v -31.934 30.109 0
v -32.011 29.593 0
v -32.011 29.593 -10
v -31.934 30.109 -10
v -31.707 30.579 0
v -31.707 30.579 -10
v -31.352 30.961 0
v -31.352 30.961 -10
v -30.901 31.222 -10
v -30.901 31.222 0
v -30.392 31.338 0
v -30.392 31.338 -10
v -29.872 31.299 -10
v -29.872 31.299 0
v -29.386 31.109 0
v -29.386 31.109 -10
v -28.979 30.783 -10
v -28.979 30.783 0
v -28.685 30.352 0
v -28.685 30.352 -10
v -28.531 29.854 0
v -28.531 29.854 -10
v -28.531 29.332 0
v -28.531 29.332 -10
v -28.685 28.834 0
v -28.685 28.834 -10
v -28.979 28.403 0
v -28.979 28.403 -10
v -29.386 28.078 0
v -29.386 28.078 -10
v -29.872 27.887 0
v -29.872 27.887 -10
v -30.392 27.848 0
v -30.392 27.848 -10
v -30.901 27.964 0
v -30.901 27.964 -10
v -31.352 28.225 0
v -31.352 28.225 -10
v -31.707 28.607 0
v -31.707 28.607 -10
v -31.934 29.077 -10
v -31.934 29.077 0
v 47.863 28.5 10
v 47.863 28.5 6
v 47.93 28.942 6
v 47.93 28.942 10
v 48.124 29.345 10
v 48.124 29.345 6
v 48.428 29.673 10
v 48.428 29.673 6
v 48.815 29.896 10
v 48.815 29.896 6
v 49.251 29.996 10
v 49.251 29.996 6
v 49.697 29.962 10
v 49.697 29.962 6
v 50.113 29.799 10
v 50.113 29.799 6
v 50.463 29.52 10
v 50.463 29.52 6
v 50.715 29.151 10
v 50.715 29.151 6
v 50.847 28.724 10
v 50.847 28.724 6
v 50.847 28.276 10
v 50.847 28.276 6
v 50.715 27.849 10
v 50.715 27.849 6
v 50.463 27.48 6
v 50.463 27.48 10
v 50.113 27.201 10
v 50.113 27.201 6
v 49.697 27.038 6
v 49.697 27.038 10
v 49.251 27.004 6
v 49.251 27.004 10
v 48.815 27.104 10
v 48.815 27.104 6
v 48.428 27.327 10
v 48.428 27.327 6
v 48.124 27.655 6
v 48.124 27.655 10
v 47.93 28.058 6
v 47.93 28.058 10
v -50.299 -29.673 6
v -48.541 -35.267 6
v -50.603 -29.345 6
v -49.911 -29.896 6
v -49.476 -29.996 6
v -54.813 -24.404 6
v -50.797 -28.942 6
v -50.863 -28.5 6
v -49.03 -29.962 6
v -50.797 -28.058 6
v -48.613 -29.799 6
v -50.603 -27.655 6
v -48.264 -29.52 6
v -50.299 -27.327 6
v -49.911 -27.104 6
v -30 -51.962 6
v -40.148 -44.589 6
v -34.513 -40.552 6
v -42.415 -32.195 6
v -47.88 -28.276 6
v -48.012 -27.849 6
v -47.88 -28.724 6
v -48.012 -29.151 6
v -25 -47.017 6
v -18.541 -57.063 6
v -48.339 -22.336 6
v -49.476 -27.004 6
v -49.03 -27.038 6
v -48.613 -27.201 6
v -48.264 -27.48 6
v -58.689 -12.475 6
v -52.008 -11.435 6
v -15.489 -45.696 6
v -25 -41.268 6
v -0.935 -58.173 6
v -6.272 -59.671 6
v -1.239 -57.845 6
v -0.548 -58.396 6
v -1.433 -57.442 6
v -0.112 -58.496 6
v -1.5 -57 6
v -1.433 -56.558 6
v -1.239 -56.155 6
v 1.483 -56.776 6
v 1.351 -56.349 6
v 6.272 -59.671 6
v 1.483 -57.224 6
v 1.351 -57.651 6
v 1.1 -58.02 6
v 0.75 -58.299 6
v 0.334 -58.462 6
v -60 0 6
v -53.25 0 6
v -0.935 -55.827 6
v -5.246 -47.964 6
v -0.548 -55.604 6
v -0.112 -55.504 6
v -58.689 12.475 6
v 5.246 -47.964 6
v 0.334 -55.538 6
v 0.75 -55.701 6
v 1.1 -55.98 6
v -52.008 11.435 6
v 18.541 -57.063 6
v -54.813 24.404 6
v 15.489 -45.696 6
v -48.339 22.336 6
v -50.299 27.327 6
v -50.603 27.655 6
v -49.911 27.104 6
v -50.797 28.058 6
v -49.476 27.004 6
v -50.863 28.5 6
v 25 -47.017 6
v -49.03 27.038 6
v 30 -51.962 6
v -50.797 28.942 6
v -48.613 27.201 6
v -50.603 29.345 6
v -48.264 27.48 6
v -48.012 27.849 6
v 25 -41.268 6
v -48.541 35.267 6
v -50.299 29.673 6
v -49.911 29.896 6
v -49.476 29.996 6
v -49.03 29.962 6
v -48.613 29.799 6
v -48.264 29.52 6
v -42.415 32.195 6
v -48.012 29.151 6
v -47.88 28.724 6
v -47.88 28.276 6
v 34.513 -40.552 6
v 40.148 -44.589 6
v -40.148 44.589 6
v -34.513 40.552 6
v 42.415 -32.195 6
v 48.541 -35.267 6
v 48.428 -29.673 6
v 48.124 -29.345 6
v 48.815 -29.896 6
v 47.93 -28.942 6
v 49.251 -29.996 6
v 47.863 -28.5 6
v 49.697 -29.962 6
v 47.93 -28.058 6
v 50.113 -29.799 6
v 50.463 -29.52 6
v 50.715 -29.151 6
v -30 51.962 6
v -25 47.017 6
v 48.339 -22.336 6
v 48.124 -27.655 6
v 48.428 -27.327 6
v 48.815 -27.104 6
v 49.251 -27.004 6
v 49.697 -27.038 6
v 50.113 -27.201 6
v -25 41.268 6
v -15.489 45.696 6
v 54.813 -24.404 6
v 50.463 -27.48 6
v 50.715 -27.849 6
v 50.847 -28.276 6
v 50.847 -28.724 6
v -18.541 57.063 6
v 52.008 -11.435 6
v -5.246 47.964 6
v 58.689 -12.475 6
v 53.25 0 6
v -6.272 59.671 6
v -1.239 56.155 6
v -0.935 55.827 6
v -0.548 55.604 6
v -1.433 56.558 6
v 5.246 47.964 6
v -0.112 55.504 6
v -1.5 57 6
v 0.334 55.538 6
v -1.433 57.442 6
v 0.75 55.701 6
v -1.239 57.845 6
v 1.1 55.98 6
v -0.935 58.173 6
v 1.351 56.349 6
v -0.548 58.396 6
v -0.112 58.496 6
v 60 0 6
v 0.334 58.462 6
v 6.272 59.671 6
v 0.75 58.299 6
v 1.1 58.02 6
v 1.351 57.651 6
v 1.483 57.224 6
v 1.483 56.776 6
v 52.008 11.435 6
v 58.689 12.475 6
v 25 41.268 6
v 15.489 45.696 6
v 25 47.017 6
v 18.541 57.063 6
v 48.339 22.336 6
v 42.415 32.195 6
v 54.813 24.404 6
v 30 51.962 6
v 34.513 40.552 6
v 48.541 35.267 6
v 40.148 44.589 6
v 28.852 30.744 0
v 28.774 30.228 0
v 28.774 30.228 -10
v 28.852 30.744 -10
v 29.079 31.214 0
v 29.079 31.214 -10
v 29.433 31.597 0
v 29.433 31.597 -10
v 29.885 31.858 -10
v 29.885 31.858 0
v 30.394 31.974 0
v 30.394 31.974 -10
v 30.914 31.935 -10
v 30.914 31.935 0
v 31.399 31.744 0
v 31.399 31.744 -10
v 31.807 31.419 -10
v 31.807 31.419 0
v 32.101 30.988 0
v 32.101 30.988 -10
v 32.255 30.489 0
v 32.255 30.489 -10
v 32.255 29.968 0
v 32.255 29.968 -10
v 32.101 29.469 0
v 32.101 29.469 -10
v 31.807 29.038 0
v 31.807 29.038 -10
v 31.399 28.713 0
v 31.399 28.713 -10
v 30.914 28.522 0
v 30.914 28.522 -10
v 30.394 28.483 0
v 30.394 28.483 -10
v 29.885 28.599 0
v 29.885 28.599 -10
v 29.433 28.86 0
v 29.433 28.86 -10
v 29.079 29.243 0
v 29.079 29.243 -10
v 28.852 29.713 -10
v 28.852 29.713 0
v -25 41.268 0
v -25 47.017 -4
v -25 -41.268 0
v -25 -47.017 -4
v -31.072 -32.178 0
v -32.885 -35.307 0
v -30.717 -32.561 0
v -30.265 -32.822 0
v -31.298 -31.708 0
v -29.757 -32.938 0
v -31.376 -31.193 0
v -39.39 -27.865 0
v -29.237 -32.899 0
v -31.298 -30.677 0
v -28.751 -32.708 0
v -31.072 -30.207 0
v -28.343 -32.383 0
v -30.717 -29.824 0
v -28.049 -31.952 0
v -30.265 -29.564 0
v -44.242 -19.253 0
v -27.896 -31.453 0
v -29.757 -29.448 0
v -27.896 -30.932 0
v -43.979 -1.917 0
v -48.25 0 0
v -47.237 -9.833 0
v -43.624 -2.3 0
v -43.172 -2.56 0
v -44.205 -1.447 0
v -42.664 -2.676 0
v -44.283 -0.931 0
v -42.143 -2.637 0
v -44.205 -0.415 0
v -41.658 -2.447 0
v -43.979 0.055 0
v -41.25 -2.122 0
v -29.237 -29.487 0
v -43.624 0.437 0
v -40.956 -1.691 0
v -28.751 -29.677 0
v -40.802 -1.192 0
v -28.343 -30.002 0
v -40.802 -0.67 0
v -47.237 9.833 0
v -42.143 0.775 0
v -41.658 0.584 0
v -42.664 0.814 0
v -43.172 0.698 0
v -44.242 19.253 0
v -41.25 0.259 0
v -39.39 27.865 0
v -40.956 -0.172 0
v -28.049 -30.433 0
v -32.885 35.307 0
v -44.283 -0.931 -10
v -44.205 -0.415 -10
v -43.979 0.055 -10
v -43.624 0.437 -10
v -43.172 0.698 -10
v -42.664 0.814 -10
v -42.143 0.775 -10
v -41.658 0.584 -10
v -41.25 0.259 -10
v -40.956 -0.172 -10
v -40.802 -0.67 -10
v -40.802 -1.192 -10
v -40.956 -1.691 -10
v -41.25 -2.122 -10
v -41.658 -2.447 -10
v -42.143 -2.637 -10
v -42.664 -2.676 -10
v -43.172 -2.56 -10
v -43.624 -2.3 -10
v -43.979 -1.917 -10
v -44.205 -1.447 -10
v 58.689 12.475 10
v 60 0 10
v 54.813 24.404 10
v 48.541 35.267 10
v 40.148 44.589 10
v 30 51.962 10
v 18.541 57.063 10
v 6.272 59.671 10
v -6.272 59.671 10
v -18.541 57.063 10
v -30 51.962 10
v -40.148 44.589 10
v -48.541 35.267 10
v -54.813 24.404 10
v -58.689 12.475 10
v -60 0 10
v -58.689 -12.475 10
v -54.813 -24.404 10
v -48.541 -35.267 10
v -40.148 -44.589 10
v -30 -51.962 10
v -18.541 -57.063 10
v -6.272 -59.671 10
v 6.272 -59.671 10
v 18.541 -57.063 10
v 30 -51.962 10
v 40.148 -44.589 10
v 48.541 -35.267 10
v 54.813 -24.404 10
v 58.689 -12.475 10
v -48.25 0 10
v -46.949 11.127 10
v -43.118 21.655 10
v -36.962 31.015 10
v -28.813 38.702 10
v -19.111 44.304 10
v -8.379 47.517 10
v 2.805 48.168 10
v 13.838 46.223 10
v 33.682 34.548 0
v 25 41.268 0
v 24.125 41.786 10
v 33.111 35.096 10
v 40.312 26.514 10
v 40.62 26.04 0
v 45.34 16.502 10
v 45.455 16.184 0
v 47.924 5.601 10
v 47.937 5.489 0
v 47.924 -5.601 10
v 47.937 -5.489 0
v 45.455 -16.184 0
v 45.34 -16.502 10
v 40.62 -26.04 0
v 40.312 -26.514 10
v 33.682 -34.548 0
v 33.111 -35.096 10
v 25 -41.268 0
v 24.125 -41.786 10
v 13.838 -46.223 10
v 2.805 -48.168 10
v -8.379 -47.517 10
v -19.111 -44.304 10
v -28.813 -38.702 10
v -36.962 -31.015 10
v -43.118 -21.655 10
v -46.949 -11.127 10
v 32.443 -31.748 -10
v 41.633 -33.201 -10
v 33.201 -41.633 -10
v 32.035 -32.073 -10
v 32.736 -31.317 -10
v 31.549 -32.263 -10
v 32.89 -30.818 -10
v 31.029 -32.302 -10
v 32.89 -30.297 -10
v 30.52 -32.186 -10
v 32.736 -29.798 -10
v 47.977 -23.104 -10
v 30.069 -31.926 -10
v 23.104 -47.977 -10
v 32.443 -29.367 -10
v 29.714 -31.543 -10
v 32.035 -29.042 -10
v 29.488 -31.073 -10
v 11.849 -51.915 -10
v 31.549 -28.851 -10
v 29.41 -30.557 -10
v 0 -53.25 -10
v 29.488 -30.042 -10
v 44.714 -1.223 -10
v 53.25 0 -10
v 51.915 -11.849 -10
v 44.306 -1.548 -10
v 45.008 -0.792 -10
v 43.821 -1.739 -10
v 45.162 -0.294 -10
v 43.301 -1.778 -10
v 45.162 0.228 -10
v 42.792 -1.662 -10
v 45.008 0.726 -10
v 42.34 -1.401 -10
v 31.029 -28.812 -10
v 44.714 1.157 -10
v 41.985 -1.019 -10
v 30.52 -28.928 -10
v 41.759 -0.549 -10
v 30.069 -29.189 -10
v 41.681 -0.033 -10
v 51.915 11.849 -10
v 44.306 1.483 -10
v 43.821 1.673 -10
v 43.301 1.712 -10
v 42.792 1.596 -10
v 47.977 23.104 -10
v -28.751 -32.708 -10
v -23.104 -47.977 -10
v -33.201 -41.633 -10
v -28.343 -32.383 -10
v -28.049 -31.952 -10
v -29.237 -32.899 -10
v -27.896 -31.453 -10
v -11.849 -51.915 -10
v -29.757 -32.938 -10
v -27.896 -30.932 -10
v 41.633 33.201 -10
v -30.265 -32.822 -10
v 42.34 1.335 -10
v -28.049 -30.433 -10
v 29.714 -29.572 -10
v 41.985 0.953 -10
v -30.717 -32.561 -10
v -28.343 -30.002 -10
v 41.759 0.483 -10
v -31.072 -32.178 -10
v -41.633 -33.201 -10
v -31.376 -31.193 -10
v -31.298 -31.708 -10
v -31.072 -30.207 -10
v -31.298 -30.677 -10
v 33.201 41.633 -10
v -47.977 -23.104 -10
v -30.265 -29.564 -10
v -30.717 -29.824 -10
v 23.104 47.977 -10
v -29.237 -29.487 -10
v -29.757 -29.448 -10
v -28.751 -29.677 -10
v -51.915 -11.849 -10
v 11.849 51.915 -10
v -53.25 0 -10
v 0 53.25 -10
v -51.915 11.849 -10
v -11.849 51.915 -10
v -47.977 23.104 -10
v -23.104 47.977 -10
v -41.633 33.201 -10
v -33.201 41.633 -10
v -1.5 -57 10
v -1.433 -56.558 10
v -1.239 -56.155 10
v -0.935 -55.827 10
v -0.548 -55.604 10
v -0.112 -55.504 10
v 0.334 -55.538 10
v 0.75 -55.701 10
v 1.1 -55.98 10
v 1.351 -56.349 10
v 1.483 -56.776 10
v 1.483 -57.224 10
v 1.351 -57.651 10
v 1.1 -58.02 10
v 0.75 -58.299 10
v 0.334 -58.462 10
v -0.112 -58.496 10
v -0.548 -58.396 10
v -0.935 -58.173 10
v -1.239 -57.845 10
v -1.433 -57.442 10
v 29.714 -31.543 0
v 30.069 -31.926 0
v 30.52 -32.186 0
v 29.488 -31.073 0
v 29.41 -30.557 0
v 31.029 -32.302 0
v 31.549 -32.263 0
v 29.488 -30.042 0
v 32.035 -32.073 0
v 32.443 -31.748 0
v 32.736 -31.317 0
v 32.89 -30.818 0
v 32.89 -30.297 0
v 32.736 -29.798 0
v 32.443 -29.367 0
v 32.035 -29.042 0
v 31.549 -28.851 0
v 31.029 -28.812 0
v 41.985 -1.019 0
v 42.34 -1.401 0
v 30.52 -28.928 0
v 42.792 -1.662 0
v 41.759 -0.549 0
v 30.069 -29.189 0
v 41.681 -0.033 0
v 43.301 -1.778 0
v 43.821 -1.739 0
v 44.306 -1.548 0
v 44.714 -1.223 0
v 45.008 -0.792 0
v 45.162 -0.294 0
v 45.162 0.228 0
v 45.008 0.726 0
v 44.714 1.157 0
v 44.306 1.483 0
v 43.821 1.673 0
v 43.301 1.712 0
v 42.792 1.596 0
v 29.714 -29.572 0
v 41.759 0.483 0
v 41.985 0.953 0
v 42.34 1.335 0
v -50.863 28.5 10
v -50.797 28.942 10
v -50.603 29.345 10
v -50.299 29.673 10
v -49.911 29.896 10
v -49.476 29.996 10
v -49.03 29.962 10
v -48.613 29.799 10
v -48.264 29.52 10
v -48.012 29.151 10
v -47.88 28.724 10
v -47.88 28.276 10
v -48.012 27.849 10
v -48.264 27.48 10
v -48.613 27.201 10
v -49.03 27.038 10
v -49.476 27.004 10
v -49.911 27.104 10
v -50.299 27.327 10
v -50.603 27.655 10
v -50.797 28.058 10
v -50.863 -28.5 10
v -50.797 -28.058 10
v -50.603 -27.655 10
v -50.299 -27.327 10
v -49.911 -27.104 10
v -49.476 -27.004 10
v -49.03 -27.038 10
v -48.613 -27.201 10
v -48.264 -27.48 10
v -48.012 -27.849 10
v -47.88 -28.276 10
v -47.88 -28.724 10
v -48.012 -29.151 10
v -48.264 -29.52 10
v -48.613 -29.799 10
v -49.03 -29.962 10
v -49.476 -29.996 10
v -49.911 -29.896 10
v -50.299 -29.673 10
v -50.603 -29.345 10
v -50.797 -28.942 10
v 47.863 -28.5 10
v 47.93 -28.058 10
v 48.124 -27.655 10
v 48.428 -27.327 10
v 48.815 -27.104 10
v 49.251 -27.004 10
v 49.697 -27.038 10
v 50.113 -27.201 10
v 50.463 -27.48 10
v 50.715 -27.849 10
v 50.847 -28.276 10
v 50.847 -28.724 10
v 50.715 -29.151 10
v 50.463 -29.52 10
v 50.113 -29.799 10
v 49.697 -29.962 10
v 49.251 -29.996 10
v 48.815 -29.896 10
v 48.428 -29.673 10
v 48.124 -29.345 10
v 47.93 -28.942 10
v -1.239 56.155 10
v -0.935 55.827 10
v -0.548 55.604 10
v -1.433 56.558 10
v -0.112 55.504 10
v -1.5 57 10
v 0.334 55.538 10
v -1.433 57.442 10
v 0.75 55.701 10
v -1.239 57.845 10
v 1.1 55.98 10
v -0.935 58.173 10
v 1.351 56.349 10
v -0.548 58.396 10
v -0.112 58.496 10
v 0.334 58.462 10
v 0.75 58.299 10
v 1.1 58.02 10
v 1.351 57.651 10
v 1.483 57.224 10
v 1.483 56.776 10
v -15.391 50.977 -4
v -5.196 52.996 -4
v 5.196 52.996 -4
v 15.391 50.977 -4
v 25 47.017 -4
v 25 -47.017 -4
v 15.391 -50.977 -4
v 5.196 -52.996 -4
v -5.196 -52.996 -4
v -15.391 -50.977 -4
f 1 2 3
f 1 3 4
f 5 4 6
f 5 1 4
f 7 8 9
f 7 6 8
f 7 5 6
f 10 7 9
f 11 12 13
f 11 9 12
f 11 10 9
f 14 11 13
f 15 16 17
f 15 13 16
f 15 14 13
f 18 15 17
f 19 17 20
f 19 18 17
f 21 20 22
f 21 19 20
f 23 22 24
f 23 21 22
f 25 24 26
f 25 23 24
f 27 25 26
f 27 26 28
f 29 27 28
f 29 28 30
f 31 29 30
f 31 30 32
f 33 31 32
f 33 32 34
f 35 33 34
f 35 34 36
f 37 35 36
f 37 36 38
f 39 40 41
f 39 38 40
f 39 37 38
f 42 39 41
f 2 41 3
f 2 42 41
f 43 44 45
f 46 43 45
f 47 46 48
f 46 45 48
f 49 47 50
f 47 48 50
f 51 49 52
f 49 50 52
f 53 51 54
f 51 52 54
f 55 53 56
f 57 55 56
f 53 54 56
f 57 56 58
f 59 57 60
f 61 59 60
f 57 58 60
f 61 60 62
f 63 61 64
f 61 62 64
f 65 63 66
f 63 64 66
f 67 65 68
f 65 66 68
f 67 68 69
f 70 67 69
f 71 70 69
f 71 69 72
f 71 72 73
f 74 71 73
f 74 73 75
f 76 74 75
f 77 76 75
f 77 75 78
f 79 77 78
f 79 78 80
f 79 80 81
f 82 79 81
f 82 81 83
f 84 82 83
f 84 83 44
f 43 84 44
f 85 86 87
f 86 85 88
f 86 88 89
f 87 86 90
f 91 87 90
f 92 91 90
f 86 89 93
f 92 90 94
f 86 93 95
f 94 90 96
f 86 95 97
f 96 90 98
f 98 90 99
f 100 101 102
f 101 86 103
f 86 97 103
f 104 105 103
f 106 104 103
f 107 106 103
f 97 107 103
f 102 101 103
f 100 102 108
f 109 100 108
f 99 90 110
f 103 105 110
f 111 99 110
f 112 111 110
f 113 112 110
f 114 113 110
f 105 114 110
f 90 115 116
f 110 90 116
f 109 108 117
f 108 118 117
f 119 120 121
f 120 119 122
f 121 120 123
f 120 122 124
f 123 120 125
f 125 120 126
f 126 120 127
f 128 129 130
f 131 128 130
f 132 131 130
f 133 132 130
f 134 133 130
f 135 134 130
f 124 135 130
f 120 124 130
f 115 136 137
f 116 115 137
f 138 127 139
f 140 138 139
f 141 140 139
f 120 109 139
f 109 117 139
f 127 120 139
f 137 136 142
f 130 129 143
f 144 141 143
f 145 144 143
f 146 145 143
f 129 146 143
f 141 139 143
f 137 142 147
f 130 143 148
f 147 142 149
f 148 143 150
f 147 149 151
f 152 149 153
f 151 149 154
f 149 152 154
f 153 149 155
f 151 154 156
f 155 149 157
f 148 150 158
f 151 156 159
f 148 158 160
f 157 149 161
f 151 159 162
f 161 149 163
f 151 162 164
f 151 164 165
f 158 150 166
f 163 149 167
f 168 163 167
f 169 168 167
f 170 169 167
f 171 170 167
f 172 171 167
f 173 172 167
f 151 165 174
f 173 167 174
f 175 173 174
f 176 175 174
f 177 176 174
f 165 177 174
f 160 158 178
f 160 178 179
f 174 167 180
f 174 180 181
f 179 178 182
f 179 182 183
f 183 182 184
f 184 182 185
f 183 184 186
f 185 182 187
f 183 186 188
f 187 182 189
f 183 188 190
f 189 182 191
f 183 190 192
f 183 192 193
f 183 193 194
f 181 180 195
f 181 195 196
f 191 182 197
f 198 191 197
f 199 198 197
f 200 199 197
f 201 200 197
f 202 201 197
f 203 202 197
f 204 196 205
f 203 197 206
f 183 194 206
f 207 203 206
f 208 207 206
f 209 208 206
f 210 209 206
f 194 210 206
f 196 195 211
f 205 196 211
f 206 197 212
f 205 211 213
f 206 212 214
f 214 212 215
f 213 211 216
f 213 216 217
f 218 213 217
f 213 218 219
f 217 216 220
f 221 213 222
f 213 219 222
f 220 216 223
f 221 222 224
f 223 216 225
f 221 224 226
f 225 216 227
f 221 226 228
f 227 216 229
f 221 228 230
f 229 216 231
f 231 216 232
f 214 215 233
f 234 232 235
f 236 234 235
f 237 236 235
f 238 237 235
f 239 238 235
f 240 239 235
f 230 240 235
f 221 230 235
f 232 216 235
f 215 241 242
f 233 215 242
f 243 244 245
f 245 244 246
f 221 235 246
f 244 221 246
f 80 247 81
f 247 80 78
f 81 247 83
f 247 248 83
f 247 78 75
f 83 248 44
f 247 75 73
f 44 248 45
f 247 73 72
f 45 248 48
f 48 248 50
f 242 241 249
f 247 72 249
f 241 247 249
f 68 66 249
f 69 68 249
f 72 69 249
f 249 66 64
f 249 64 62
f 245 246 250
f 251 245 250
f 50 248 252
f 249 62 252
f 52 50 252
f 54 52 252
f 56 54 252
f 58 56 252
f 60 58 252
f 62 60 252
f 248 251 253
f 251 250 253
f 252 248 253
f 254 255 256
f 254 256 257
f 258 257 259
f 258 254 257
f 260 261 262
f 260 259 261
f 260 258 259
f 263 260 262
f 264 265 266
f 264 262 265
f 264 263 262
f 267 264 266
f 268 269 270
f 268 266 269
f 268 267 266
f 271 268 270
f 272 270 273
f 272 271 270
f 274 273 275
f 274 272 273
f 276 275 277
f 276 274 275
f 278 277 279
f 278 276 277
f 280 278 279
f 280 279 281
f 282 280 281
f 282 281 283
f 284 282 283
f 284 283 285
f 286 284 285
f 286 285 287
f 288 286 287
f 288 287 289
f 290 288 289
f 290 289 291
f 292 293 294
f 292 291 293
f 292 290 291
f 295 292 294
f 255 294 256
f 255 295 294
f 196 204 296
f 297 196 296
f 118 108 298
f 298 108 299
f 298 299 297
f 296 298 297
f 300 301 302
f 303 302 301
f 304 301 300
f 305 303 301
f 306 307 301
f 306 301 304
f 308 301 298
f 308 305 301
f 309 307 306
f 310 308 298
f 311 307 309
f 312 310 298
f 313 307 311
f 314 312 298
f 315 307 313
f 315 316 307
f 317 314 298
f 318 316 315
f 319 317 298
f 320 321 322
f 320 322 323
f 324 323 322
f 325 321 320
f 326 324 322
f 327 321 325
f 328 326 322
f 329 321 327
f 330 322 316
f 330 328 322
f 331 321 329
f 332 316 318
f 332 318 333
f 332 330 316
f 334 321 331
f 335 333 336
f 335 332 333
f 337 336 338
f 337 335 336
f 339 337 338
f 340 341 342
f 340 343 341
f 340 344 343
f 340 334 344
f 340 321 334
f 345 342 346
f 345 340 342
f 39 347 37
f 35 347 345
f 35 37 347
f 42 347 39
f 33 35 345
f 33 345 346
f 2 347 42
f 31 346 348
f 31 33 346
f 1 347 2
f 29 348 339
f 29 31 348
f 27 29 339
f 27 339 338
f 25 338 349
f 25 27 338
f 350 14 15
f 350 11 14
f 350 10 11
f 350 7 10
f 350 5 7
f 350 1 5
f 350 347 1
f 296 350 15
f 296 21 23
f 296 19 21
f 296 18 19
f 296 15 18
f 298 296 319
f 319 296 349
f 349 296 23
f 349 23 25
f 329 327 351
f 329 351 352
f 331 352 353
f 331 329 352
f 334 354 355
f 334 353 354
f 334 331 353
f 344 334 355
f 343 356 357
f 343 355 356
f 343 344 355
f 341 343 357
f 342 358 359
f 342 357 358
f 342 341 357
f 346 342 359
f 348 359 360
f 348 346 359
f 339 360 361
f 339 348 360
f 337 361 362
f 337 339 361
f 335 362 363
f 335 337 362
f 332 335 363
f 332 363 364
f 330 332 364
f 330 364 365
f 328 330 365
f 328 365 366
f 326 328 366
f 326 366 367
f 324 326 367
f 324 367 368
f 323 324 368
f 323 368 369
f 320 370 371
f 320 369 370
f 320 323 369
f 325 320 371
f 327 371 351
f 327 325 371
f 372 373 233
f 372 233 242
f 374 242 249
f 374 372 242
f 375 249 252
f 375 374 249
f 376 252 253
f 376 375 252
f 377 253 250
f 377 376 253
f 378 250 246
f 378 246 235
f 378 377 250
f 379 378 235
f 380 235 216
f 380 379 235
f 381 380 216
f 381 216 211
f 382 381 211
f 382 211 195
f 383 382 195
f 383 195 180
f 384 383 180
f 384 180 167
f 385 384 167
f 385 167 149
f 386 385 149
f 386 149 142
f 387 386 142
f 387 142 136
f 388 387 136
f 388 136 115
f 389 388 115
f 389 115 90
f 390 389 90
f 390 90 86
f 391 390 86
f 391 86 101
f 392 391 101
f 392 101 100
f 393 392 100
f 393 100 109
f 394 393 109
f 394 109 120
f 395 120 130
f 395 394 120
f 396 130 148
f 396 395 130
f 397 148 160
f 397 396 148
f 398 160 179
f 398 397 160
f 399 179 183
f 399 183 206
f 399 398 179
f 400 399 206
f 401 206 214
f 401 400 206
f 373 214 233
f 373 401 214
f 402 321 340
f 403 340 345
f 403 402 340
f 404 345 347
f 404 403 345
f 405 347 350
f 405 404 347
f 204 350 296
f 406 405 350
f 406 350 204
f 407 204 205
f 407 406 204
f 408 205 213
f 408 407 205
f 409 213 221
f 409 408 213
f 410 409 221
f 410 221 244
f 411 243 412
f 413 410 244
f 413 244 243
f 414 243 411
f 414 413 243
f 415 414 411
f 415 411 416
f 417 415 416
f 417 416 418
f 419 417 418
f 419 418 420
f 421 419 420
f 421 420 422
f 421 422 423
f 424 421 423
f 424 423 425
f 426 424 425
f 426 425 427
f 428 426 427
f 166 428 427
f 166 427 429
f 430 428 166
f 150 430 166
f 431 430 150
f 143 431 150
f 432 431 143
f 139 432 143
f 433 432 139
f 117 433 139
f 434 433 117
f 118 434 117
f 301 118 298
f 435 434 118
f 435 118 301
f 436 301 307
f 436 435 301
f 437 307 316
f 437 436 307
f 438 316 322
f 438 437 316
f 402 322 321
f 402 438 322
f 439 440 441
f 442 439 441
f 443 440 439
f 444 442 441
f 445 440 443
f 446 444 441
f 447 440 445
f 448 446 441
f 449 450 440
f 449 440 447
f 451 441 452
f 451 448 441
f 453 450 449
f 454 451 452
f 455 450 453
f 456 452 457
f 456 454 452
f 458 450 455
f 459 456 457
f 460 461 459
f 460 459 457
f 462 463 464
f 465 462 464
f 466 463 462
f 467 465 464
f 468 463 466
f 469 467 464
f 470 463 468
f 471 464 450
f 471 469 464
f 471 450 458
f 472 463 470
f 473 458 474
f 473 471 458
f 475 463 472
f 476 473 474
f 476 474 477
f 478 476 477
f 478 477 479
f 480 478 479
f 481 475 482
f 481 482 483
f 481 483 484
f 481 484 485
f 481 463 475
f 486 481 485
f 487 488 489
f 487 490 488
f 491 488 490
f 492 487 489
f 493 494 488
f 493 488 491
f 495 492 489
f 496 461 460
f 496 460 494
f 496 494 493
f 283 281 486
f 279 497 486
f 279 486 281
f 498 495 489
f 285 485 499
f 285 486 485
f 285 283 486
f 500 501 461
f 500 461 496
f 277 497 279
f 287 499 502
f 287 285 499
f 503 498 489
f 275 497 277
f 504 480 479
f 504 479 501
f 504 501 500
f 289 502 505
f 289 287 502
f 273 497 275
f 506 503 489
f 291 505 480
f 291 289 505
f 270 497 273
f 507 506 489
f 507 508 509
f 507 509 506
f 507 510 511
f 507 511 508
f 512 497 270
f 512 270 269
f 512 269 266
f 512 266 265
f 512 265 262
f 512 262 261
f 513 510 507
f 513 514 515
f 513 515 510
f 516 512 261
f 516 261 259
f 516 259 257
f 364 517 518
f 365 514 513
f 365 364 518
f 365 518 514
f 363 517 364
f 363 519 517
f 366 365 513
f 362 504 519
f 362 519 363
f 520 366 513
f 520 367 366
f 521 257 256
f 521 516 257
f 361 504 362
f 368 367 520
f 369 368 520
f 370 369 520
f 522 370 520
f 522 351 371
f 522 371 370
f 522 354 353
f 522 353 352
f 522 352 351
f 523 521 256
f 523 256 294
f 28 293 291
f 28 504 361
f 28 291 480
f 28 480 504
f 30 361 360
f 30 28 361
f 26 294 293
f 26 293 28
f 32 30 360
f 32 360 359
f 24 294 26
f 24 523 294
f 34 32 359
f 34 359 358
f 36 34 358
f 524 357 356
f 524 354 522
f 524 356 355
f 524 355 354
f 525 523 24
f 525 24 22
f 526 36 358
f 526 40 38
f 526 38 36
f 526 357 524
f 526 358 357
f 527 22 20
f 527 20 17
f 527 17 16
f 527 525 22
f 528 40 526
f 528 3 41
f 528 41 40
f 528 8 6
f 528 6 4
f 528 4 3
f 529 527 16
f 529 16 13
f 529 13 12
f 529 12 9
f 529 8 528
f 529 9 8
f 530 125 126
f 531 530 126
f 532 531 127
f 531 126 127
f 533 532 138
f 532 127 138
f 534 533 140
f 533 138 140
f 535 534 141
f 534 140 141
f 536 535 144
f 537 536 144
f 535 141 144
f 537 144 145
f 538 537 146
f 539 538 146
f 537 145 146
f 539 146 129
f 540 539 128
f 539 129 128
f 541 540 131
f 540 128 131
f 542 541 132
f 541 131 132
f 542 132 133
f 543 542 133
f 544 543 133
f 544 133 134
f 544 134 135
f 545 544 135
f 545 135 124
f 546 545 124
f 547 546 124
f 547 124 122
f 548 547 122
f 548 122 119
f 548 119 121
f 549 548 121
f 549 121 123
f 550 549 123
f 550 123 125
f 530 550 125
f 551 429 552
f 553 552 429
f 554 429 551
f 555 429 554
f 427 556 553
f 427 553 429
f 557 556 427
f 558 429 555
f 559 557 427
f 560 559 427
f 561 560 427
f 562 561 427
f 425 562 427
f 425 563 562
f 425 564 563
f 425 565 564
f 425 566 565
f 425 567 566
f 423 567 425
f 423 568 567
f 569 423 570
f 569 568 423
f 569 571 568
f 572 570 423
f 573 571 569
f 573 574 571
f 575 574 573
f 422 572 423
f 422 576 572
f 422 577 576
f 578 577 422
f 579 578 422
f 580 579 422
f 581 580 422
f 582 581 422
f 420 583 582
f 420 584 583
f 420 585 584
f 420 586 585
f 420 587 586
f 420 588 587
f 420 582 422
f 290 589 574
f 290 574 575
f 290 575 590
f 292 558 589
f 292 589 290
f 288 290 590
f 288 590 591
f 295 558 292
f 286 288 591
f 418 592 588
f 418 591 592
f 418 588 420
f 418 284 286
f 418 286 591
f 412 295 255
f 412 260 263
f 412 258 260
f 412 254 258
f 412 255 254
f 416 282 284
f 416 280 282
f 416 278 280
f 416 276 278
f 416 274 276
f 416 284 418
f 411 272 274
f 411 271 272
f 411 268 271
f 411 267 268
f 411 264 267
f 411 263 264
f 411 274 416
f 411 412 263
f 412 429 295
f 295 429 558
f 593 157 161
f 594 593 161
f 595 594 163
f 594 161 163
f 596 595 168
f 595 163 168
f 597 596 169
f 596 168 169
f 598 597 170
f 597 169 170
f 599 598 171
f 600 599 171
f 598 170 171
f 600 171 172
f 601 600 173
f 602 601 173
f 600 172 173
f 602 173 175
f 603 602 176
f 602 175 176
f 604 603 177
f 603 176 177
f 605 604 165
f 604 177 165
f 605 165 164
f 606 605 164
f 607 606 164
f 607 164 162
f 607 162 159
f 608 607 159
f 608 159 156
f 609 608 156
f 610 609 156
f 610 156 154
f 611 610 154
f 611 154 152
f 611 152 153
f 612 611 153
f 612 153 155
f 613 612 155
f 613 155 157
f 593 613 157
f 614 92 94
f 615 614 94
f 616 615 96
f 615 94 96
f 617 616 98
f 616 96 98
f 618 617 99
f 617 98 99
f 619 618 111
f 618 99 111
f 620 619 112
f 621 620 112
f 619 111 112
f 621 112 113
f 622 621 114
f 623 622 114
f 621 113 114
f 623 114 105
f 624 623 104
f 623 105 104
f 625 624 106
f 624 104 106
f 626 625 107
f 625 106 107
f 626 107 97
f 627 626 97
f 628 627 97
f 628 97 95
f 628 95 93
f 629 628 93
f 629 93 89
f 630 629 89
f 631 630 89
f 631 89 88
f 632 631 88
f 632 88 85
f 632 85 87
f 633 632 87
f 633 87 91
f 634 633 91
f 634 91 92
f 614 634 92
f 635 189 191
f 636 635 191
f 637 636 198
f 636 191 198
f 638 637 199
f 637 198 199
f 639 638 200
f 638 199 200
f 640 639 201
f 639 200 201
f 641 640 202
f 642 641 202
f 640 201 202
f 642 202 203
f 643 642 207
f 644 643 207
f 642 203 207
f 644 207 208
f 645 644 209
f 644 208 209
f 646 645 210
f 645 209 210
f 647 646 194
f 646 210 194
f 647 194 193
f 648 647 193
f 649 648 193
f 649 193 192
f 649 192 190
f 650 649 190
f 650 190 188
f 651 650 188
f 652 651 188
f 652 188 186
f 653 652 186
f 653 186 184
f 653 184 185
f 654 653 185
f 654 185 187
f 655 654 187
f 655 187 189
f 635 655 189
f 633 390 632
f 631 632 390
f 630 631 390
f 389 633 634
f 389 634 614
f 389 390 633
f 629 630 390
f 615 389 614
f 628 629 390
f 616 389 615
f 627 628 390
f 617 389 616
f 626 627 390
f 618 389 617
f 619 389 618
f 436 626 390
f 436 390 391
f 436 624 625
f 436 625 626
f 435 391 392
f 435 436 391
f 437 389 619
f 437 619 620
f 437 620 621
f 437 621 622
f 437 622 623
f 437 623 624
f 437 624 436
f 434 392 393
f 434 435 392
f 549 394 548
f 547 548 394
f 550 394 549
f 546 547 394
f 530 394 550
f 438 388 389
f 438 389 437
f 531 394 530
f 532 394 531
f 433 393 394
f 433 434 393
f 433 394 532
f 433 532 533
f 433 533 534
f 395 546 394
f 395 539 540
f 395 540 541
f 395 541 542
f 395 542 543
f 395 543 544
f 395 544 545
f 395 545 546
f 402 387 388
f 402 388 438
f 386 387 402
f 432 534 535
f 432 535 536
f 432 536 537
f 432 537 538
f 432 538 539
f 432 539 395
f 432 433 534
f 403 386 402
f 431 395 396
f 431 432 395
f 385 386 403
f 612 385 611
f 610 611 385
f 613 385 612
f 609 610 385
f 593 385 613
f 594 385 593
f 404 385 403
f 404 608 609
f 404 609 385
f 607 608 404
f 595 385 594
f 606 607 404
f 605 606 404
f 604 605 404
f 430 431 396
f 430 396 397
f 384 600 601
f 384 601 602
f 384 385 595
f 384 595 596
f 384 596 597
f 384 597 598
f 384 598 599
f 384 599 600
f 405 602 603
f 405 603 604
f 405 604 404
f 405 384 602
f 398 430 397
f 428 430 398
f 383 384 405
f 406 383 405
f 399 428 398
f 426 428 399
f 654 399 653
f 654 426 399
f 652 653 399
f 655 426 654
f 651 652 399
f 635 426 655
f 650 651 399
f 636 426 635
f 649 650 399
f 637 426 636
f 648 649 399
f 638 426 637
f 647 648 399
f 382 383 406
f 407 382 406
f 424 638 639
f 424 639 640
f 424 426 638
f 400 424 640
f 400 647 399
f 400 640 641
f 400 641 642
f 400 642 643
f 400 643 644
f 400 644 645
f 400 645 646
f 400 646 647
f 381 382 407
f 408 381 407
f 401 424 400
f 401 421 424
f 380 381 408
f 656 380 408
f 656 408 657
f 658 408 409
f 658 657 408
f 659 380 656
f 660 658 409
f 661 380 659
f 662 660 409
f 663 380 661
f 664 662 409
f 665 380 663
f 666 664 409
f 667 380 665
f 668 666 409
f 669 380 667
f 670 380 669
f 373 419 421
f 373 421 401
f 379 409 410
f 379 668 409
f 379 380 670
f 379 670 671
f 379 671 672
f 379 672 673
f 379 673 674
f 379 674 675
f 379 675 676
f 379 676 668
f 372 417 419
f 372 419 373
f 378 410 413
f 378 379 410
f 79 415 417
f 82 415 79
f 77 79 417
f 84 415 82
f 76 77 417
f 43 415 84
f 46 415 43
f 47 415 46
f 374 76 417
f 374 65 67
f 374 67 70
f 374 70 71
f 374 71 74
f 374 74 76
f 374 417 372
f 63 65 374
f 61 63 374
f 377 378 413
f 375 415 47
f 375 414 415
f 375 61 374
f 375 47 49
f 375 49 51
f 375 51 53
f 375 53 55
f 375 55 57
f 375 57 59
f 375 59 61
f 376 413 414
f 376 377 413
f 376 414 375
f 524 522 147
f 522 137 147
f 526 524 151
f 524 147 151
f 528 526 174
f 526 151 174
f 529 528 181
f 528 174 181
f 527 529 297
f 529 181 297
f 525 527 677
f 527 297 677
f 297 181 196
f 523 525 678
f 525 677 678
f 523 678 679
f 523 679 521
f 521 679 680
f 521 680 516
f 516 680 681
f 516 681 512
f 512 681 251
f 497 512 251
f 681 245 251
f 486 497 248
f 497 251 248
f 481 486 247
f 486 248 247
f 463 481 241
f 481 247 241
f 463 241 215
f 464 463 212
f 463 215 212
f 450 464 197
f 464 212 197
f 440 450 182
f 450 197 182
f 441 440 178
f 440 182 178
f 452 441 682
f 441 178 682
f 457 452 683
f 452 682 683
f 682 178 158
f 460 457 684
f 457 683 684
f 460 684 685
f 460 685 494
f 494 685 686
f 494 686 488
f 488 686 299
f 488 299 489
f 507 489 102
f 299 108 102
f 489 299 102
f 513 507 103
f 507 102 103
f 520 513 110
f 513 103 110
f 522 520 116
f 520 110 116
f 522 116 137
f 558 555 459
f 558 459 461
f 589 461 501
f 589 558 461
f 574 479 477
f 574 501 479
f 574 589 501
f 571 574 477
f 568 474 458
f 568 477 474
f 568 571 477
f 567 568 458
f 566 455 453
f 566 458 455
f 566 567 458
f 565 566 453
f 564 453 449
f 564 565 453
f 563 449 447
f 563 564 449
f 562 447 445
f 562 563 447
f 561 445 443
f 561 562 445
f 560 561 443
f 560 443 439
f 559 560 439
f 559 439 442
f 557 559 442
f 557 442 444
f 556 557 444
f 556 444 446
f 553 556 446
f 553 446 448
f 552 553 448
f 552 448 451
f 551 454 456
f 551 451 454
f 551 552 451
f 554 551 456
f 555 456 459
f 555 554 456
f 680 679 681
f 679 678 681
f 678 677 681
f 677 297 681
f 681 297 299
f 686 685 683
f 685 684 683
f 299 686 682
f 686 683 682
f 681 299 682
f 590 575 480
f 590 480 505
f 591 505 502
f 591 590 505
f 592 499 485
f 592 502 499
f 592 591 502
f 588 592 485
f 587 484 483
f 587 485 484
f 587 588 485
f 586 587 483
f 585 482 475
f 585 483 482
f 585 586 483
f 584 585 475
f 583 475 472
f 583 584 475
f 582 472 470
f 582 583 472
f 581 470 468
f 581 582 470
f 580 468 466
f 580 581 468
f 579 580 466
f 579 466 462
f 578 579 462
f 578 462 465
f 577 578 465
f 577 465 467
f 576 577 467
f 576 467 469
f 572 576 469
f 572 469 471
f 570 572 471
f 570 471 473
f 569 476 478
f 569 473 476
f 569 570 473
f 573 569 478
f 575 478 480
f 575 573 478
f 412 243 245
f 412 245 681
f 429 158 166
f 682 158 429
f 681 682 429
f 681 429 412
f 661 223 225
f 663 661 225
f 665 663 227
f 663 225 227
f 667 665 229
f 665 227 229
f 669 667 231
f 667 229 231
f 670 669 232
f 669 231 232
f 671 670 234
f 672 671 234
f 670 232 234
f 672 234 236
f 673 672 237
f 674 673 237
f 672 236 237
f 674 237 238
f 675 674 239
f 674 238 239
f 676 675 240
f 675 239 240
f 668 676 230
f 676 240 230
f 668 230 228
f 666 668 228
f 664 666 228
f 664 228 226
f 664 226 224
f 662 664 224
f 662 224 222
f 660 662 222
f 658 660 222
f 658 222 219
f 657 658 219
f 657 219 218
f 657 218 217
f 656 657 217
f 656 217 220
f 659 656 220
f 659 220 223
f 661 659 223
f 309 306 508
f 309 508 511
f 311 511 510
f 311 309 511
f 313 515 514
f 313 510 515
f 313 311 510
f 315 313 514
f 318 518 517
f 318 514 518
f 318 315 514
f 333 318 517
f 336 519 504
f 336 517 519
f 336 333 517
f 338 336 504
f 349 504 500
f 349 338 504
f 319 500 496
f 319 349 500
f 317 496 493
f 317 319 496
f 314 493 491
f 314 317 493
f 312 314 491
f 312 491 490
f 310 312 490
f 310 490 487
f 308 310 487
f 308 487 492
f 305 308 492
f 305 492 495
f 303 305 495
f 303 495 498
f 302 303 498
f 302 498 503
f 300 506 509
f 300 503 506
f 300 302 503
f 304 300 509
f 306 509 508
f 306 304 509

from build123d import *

# Parameters (mm, degrees)
SKETCH_1_R               = 1.75
EXTRUDE_1_DEPTH          = 15
EXTRUDE_1_2_DEPTH        = 15
EXTRUDE_1_3_DEPTH        = 15
EXTRUDE_1_4_DEPTH        = 15
EXTRUDE_1_5_DEPTH        = 15
EXTRUDE_1_6_DEPTH        = 15
EXTRUDE_1_7_DEPTH        = 15
EXTRUDE_1_8_DEPTH        = 15
SKETCH_2_R               = 48.25
EXTRUDE_2_DEPTH          = 5
EXTRUDE_START            = -15
SKETCH_3_R               = 53.25
SKETCH_3_R_2             = 48.25
EXTRUDE_1_9_DEPTH        = 15
SKETCH_4_R               = 60
SKETCH_4_R_2             = 48.25
EXTRUDE_3_DEPTH          = 4
CUT_EXTRUDE_1_REACH      = 87.563
SKETCH_6_R               = 1.5
CUT_EXTRUDE_3_DEPTH      = 94.407708461
CUT_EXTRUDE_3_DEPTH_BACK = 94.407708461
SKETCH_9_W               = 50
SKETCH_9_H               = 10
SKETCH_10_R              = 53.25
EXTRUDE_4_DEPTH          = 5
CUT_EXTRUDE_4_DEPTH      = 89.459030065
CUT_EXTRUDE_4_DEPTH_BACK = 89.459030065
SKETCH_11_R              = 1.75


with BuildPart() as part:
    # 草图1 → Extrude 1 (new body)
    with BuildSketch(Plane.XY):
        with Locations((43.431304103, -0.032870953)):
            Circle(SKETCH_1_R)
    extrude(amount=EXTRUDE_1_DEPTH)



with BuildPart() as body_2:
    # 草图1 → Extrude 1 2 (new body)
    with BuildSketch(Plane.XY):
        with Locations((31.159786222, -30.557369002)):
            Circle(SKETCH_1_R)
    extrude(amount=EXTRUDE_1_2_DEPTH)


with BuildPart() as body_3:
    # 草图1 → Extrude 1 3 (new body)
    with BuildSketch(Plane.XY):
        with Locations((0.89843315, -43.464175056)):
            Circle(SKETCH_1_R)
    extrude(amount=EXTRUDE_1_3_DEPTH)


with BuildPart() as body_4:
    # 草图1 → Extrude 1 4 (new body)
    with BuildSketch(Plane.XY):
        with Locations((-29.626064899, -31.192657175)):
            Circle(SKETCH_1_R)
    extrude(amount=EXTRUDE_1_4_DEPTH)


with BuildPart() as body_5:
    # 草图1 → Extrude 1 5 (new body)
    with BuildSketch(Plane.XY):
        with Locations((-42.532870953, -0.931304103)):
            Circle(SKETCH_1_R)
    extrude(amount=EXTRUDE_1_5_DEPTH)


with BuildPart() as body_6:
    # 草图1 → Extrude 1 6 (new body)
    with BuildSketch(Plane.XY):
        with Locations((-30.261353072, 29.593193946)):
            Circle(SKETCH_1_R)
    extrude(amount=EXTRUDE_1_6_DEPTH)


with BuildPart() as body_7:
    # 草图1 → Extrude 1 7 (new body)
    with BuildSketch(Plane.XY):
        with Locations((0, 42.5)):
            Circle(SKETCH_1_R)
    extrude(amount=EXTRUDE_1_7_DEPTH)


with BuildPart() as body_8:
    # 草图1 → Extrude 1 8 (new body)
    with BuildSketch(Plane.XY):
        with Locations((30.524498049, 30.228482119)):
            Circle(SKETCH_1_R)
    extrude(amount=EXTRUDE_1_8_DEPTH)


with BuildPart() as part_1:
    add(part.part)

    add(body_2.part)  # 凸台-拉伸2 merges body 2

    add(body_3.part)  # 凸台-拉伸2 merges body 3

    add(body_4.part)  # 凸台-拉伸2 merges body 4

    add(body_5.part)  # 凸台-拉伸2 merges body 5

    add(body_6.part)  # 凸台-拉伸2 merges body 6

    add(body_7.part)  # 凸台-拉伸2 merges body 7

    add(body_8.part)  # 凸台-拉伸2 merges body 8
    # 草图2 → 凸台-拉伸2 (add)
    with BuildSketch(Plane.XY):
        Circle(SKETCH_2_R)
    extrude(amount=-EXTRUDE_2_DEPTH)

    # 草图3 → Extrude 1 9 (add)
    with BuildSketch(Plane(origin=(0, 0, -5), x_dir=(-1, 0, 0), z_dir=(0, 0, -1)).offset(EXTRUDE_START)):
        Circle(SKETCH_3_R)
        Circle(SKETCH_3_R_2, mode=Mode.SUBTRACT)
    extrude(amount=EXTRUDE_1_9_DEPTH)

    # 草图4 → 凸台-拉伸3 (add)
    with BuildSketch(Plane.XY.offset(10)):
        Circle(SKETCH_4_R)
        with Locations(Location((0, 0, 0), (0, 0, 180))):
            Circle(SKETCH_4_R_2, mode=Mode.SUBTRACT)
    extrude(amount=-EXTRUDE_3_DEPTH)

    # 草图6 → 切除-拉伸1 (cut, up to next)
    with BuildSketch(Plane(origin=(0, 0, 6), x_dir=(-1, 0, 0), z_dir=(0, 0, -1)), mode=Mode.PRIVATE) as cut_extrude_1_sk1:
        with Locations((0, 57)):
            Circle(SKETCH_6_R)
    cut_extrude_1_tool1 = extrude(cut_extrude_1_sk1.sketch, amount=-CUT_EXTRUDE_1_REACH, mode=Mode.PRIVATE) & part_1.part
    # 草图6 → 切除-拉伸1 (cut, up to next)
    with BuildSketch(Plane(origin=(0, 0, 6), x_dir=(-1, 0, 0), z_dir=(0, 0, -1)), mode=Mode.PRIVATE) as cut_extrude_1_sk2:
        with Locations((49.363448016, 28.5)):
            Circle(SKETCH_6_R)
    cut_extrude_1_tool2 = extrude(cut_extrude_1_sk2.sketch, amount=-CUT_EXTRUDE_1_REACH, mode=Mode.PRIVATE) & part_1.part
    # 草图6 → 切除-拉伸1 (cut, up to next)
    with BuildSketch(Plane(origin=(0, 0, 6), x_dir=(-1, 0, 0), z_dir=(0, 0, -1)), mode=Mode.PRIVATE) as cut_extrude_1_sk3:
        with Locations((49.363448016, -28.5)):
            Circle(SKETCH_6_R)
    cut_extrude_1_tool3 = extrude(cut_extrude_1_sk3.sketch, amount=-CUT_EXTRUDE_1_REACH, mode=Mode.PRIVATE) & part_1.part
    # 草图6 → 切除-拉伸1 (cut, up to next)
    with BuildSketch(Plane(origin=(0, 0, 6), x_dir=(-1, 0, 0), z_dir=(0, 0, -1)), mode=Mode.PRIVATE) as cut_extrude_1_sk4:
        with Locations((0, -57)):
            Circle(SKETCH_6_R)
    cut_extrude_1_tool4 = extrude(cut_extrude_1_sk4.sketch, amount=-CUT_EXTRUDE_1_REACH, mode=Mode.PRIVATE) & part_1.part
    # 草图6 → 切除-拉伸1 (cut, up to next)
    with BuildSketch(Plane(origin=(0, 0, 6), x_dir=(-1, 0, 0), z_dir=(0, 0, -1)), mode=Mode.PRIVATE) as cut_extrude_1_sk5:
        with Locations((-49.363448016, -28.5)):
            Circle(SKETCH_6_R)
    cut_extrude_1_tool5 = extrude(cut_extrude_1_sk5.sketch, amount=-CUT_EXTRUDE_1_REACH, mode=Mode.PRIVATE) & part_1.part
    # 草图6 → 切除-拉伸1 (cut, up to next)
    with BuildSketch(Plane(origin=(0, 0, 6), x_dir=(-1, 0, 0), z_dir=(0, 0, -1)), mode=Mode.PRIVATE) as cut_extrude_1_sk6:
        with Locations((-49.363448016, 28.5)):
            Circle(SKETCH_6_R)
    cut_extrude_1_tool6 = extrude(cut_extrude_1_sk6.sketch, amount=-CUT_EXTRUDE_1_REACH, mode=Mode.PRIVATE) & part_1.part
    add(cut_extrude_1_tool1.solids().sort_by_distance((0, 57, 6))[0], mode=Mode.SUBTRACT)
    add(cut_extrude_1_tool2.solids().sort_by_distance((-49.363448, 28.5, 6))[0], mode=Mode.SUBTRACT)
    add(cut_extrude_1_tool3.solids().sort_by_distance((-49.363448, -28.5, 6))[0], mode=Mode.SUBTRACT)
    add(cut_extrude_1_tool4.solids().sort_by_distance((0, -57, 6))[0], mode=Mode.SUBTRACT)
    add(cut_extrude_1_tool5.solids().sort_by_distance((49.363448, -28.5, 6))[0], mode=Mode.SUBTRACT)
    add(cut_extrude_1_tool6.solids().sort_by_distance((49.363448, 28.5, 6))[0], mode=Mode.SUBTRACT)

    # 草图9 → 切除-拉伸3 (cut, two sides: drawn at the far end of the back side and taken through both)
    with BuildSketch(Plane(origin=(0, 10, 0), x_dir=(1, 0, 0), z_dir=(0, 1, 0)).offset(-CUT_EXTRUDE_3_DEPTH_BACK)):
        with Locations((0, -1)):
            Rectangle(SKETCH_9_W, SKETCH_9_H)
    extrude(amount=CUT_EXTRUDE_3_DEPTH + CUT_EXTRUDE_3_DEPTH_BACK, mode=Mode.SUBTRACT)


with BuildPart() as body_2_2:
    # of the pieces the cut leaves, the one that is kept (cut_extrude_3_keep)
    add(part_1.part.solids().sort_by_distance((-25, 41.268177813, 0))[0])

    # 草图10 → 凸台-拉伸4 (add)
    with BuildSketch(Plane(origin=(0, 0, -5), x_dir=(-1, 0, 0), z_dir=(0, 0, -1))):
        Circle(SKETCH_10_R)
    extrude(amount=EXTRUDE_4_DEPTH)

    # 草图11 → 切除-拉伸4 (cut, two sides: drawn at the far end of the back side and taken through both)
    with BuildSketch(Plane(origin=(0, 0, -10), x_dir=(-1, 0, 0), z_dir=(0, 0, -1)).offset(-CUT_EXTRUDE_4_DEPTH_BACK)):
        with Locations((30.261353072, 29.593193946)):
            Circle(SKETCH_11_R)
        with Locations((42.532870953, -0.931304103)):
            Circle(SKETCH_11_R)
        with Locations((29.626064899, -31.192657175)):
            Circle(SKETCH_11_R)
        with Locations((-31.159786222, -30.557369002)):
            Circle(SKETCH_11_R)
        with Locations((-43.431304103, -0.032870953)):
            Circle(SKETCH_11_R)
        with Locations((-30.524498049, 30.228482119)):
            Circle(SKETCH_11_R)
    extrude(amount=CUT_EXTRUDE_4_DEPTH + CUT_EXTRUDE_4_DEPTH_BACK, mode=Mode.SUBTRACT)


solid = body_2_2.part
